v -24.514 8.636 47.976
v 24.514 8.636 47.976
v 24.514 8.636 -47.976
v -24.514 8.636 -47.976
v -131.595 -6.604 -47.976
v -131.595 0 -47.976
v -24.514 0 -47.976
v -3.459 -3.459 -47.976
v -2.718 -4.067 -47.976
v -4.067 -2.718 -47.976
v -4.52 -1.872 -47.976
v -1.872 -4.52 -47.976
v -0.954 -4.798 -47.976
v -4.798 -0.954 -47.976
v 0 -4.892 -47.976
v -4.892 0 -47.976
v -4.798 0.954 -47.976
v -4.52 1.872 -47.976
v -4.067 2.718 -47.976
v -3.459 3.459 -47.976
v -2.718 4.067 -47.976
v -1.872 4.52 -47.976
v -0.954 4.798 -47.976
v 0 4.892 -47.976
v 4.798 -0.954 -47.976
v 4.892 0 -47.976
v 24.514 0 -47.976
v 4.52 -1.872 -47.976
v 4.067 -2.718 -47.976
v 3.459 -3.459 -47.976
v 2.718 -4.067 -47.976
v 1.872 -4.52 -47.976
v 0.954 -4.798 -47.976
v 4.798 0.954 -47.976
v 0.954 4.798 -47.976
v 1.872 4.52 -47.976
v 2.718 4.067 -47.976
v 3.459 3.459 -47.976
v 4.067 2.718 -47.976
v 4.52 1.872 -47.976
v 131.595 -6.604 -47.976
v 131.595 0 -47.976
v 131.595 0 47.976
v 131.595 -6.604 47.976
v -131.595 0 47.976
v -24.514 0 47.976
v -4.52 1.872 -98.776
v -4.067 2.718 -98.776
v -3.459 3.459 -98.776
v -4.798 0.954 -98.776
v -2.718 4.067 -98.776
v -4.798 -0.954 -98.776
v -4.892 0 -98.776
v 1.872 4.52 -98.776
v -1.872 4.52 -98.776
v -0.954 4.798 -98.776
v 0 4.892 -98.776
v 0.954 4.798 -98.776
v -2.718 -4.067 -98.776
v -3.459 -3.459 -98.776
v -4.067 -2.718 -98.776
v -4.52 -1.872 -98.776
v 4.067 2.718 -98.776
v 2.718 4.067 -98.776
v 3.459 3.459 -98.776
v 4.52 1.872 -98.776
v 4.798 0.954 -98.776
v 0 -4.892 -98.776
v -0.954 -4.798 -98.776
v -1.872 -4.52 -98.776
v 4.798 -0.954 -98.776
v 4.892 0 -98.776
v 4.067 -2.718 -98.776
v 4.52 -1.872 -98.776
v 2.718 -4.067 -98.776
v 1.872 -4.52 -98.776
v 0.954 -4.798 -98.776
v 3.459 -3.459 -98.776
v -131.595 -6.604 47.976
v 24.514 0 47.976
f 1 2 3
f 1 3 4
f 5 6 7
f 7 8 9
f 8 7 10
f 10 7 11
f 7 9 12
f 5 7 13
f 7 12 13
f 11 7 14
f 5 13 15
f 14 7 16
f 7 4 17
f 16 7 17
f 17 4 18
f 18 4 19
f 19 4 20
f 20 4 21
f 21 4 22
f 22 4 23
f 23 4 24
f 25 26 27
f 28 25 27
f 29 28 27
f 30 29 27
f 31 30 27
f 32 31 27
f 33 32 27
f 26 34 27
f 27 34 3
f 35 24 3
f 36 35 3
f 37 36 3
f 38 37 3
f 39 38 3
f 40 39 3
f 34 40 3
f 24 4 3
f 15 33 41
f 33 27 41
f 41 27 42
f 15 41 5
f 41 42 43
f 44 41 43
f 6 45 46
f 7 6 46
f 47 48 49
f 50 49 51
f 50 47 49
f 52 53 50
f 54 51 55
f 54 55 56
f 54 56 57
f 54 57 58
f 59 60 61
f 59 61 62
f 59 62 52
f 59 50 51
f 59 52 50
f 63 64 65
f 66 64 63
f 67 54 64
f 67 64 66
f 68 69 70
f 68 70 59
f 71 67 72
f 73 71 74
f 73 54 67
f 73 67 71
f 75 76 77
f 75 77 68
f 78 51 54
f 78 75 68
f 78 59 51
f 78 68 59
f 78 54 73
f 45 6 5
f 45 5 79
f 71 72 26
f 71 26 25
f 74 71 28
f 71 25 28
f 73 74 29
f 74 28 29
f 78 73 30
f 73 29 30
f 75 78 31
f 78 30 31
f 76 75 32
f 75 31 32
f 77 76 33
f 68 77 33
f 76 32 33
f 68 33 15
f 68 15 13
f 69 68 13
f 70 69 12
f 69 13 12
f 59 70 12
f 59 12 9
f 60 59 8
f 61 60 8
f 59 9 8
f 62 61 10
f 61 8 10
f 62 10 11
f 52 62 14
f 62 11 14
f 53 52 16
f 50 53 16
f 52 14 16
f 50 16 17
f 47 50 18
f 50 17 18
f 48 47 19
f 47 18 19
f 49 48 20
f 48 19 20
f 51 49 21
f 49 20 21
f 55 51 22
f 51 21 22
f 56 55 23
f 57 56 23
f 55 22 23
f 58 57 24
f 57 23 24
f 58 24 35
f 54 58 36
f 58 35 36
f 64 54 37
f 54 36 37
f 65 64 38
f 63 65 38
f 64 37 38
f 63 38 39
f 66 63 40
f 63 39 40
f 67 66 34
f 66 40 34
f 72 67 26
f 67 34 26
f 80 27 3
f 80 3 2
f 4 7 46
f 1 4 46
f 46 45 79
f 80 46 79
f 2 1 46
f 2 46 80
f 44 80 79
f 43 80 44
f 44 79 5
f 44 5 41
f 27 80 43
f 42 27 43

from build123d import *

# Parameters (mm, degrees)
F0_W     = 263.190776
F0_H     = 95.95184
F1_DEPTH = 6.604
F2_W     = 49.028684
F2_H     = 95.95184
F3_DEPTH = 8.636
F4_R     = 4.891878
F5_DEPTH = 50.8


with BuildPart() as f1:
    # F0 (on Front) → F1 (new body)
    with BuildSketch(Plane.XZ):
        Rectangle(F0_W, F0_H)
    extrude(amount=F1_DEPTH)

    # F2 (on face) → F3 (join)
    with BuildSketch(Plane(origin=(0, 0, 0), x_dir=(-1, 0, 0), z_dir=(0, 1, 0))):
        Rectangle(F2_W, F2_H)
    extrude(amount=F3_DEPTH)

    # F4 (on face) → F5 (join)
    with BuildSketch(Plane(origin=(0, 0, -47.97592), x_dir=(1, 0, 0), z_dir=(0, 0, -1))):
        Circle(F4_R)
    extrude(amount=F5_DEPTH)


solid = f1.part
